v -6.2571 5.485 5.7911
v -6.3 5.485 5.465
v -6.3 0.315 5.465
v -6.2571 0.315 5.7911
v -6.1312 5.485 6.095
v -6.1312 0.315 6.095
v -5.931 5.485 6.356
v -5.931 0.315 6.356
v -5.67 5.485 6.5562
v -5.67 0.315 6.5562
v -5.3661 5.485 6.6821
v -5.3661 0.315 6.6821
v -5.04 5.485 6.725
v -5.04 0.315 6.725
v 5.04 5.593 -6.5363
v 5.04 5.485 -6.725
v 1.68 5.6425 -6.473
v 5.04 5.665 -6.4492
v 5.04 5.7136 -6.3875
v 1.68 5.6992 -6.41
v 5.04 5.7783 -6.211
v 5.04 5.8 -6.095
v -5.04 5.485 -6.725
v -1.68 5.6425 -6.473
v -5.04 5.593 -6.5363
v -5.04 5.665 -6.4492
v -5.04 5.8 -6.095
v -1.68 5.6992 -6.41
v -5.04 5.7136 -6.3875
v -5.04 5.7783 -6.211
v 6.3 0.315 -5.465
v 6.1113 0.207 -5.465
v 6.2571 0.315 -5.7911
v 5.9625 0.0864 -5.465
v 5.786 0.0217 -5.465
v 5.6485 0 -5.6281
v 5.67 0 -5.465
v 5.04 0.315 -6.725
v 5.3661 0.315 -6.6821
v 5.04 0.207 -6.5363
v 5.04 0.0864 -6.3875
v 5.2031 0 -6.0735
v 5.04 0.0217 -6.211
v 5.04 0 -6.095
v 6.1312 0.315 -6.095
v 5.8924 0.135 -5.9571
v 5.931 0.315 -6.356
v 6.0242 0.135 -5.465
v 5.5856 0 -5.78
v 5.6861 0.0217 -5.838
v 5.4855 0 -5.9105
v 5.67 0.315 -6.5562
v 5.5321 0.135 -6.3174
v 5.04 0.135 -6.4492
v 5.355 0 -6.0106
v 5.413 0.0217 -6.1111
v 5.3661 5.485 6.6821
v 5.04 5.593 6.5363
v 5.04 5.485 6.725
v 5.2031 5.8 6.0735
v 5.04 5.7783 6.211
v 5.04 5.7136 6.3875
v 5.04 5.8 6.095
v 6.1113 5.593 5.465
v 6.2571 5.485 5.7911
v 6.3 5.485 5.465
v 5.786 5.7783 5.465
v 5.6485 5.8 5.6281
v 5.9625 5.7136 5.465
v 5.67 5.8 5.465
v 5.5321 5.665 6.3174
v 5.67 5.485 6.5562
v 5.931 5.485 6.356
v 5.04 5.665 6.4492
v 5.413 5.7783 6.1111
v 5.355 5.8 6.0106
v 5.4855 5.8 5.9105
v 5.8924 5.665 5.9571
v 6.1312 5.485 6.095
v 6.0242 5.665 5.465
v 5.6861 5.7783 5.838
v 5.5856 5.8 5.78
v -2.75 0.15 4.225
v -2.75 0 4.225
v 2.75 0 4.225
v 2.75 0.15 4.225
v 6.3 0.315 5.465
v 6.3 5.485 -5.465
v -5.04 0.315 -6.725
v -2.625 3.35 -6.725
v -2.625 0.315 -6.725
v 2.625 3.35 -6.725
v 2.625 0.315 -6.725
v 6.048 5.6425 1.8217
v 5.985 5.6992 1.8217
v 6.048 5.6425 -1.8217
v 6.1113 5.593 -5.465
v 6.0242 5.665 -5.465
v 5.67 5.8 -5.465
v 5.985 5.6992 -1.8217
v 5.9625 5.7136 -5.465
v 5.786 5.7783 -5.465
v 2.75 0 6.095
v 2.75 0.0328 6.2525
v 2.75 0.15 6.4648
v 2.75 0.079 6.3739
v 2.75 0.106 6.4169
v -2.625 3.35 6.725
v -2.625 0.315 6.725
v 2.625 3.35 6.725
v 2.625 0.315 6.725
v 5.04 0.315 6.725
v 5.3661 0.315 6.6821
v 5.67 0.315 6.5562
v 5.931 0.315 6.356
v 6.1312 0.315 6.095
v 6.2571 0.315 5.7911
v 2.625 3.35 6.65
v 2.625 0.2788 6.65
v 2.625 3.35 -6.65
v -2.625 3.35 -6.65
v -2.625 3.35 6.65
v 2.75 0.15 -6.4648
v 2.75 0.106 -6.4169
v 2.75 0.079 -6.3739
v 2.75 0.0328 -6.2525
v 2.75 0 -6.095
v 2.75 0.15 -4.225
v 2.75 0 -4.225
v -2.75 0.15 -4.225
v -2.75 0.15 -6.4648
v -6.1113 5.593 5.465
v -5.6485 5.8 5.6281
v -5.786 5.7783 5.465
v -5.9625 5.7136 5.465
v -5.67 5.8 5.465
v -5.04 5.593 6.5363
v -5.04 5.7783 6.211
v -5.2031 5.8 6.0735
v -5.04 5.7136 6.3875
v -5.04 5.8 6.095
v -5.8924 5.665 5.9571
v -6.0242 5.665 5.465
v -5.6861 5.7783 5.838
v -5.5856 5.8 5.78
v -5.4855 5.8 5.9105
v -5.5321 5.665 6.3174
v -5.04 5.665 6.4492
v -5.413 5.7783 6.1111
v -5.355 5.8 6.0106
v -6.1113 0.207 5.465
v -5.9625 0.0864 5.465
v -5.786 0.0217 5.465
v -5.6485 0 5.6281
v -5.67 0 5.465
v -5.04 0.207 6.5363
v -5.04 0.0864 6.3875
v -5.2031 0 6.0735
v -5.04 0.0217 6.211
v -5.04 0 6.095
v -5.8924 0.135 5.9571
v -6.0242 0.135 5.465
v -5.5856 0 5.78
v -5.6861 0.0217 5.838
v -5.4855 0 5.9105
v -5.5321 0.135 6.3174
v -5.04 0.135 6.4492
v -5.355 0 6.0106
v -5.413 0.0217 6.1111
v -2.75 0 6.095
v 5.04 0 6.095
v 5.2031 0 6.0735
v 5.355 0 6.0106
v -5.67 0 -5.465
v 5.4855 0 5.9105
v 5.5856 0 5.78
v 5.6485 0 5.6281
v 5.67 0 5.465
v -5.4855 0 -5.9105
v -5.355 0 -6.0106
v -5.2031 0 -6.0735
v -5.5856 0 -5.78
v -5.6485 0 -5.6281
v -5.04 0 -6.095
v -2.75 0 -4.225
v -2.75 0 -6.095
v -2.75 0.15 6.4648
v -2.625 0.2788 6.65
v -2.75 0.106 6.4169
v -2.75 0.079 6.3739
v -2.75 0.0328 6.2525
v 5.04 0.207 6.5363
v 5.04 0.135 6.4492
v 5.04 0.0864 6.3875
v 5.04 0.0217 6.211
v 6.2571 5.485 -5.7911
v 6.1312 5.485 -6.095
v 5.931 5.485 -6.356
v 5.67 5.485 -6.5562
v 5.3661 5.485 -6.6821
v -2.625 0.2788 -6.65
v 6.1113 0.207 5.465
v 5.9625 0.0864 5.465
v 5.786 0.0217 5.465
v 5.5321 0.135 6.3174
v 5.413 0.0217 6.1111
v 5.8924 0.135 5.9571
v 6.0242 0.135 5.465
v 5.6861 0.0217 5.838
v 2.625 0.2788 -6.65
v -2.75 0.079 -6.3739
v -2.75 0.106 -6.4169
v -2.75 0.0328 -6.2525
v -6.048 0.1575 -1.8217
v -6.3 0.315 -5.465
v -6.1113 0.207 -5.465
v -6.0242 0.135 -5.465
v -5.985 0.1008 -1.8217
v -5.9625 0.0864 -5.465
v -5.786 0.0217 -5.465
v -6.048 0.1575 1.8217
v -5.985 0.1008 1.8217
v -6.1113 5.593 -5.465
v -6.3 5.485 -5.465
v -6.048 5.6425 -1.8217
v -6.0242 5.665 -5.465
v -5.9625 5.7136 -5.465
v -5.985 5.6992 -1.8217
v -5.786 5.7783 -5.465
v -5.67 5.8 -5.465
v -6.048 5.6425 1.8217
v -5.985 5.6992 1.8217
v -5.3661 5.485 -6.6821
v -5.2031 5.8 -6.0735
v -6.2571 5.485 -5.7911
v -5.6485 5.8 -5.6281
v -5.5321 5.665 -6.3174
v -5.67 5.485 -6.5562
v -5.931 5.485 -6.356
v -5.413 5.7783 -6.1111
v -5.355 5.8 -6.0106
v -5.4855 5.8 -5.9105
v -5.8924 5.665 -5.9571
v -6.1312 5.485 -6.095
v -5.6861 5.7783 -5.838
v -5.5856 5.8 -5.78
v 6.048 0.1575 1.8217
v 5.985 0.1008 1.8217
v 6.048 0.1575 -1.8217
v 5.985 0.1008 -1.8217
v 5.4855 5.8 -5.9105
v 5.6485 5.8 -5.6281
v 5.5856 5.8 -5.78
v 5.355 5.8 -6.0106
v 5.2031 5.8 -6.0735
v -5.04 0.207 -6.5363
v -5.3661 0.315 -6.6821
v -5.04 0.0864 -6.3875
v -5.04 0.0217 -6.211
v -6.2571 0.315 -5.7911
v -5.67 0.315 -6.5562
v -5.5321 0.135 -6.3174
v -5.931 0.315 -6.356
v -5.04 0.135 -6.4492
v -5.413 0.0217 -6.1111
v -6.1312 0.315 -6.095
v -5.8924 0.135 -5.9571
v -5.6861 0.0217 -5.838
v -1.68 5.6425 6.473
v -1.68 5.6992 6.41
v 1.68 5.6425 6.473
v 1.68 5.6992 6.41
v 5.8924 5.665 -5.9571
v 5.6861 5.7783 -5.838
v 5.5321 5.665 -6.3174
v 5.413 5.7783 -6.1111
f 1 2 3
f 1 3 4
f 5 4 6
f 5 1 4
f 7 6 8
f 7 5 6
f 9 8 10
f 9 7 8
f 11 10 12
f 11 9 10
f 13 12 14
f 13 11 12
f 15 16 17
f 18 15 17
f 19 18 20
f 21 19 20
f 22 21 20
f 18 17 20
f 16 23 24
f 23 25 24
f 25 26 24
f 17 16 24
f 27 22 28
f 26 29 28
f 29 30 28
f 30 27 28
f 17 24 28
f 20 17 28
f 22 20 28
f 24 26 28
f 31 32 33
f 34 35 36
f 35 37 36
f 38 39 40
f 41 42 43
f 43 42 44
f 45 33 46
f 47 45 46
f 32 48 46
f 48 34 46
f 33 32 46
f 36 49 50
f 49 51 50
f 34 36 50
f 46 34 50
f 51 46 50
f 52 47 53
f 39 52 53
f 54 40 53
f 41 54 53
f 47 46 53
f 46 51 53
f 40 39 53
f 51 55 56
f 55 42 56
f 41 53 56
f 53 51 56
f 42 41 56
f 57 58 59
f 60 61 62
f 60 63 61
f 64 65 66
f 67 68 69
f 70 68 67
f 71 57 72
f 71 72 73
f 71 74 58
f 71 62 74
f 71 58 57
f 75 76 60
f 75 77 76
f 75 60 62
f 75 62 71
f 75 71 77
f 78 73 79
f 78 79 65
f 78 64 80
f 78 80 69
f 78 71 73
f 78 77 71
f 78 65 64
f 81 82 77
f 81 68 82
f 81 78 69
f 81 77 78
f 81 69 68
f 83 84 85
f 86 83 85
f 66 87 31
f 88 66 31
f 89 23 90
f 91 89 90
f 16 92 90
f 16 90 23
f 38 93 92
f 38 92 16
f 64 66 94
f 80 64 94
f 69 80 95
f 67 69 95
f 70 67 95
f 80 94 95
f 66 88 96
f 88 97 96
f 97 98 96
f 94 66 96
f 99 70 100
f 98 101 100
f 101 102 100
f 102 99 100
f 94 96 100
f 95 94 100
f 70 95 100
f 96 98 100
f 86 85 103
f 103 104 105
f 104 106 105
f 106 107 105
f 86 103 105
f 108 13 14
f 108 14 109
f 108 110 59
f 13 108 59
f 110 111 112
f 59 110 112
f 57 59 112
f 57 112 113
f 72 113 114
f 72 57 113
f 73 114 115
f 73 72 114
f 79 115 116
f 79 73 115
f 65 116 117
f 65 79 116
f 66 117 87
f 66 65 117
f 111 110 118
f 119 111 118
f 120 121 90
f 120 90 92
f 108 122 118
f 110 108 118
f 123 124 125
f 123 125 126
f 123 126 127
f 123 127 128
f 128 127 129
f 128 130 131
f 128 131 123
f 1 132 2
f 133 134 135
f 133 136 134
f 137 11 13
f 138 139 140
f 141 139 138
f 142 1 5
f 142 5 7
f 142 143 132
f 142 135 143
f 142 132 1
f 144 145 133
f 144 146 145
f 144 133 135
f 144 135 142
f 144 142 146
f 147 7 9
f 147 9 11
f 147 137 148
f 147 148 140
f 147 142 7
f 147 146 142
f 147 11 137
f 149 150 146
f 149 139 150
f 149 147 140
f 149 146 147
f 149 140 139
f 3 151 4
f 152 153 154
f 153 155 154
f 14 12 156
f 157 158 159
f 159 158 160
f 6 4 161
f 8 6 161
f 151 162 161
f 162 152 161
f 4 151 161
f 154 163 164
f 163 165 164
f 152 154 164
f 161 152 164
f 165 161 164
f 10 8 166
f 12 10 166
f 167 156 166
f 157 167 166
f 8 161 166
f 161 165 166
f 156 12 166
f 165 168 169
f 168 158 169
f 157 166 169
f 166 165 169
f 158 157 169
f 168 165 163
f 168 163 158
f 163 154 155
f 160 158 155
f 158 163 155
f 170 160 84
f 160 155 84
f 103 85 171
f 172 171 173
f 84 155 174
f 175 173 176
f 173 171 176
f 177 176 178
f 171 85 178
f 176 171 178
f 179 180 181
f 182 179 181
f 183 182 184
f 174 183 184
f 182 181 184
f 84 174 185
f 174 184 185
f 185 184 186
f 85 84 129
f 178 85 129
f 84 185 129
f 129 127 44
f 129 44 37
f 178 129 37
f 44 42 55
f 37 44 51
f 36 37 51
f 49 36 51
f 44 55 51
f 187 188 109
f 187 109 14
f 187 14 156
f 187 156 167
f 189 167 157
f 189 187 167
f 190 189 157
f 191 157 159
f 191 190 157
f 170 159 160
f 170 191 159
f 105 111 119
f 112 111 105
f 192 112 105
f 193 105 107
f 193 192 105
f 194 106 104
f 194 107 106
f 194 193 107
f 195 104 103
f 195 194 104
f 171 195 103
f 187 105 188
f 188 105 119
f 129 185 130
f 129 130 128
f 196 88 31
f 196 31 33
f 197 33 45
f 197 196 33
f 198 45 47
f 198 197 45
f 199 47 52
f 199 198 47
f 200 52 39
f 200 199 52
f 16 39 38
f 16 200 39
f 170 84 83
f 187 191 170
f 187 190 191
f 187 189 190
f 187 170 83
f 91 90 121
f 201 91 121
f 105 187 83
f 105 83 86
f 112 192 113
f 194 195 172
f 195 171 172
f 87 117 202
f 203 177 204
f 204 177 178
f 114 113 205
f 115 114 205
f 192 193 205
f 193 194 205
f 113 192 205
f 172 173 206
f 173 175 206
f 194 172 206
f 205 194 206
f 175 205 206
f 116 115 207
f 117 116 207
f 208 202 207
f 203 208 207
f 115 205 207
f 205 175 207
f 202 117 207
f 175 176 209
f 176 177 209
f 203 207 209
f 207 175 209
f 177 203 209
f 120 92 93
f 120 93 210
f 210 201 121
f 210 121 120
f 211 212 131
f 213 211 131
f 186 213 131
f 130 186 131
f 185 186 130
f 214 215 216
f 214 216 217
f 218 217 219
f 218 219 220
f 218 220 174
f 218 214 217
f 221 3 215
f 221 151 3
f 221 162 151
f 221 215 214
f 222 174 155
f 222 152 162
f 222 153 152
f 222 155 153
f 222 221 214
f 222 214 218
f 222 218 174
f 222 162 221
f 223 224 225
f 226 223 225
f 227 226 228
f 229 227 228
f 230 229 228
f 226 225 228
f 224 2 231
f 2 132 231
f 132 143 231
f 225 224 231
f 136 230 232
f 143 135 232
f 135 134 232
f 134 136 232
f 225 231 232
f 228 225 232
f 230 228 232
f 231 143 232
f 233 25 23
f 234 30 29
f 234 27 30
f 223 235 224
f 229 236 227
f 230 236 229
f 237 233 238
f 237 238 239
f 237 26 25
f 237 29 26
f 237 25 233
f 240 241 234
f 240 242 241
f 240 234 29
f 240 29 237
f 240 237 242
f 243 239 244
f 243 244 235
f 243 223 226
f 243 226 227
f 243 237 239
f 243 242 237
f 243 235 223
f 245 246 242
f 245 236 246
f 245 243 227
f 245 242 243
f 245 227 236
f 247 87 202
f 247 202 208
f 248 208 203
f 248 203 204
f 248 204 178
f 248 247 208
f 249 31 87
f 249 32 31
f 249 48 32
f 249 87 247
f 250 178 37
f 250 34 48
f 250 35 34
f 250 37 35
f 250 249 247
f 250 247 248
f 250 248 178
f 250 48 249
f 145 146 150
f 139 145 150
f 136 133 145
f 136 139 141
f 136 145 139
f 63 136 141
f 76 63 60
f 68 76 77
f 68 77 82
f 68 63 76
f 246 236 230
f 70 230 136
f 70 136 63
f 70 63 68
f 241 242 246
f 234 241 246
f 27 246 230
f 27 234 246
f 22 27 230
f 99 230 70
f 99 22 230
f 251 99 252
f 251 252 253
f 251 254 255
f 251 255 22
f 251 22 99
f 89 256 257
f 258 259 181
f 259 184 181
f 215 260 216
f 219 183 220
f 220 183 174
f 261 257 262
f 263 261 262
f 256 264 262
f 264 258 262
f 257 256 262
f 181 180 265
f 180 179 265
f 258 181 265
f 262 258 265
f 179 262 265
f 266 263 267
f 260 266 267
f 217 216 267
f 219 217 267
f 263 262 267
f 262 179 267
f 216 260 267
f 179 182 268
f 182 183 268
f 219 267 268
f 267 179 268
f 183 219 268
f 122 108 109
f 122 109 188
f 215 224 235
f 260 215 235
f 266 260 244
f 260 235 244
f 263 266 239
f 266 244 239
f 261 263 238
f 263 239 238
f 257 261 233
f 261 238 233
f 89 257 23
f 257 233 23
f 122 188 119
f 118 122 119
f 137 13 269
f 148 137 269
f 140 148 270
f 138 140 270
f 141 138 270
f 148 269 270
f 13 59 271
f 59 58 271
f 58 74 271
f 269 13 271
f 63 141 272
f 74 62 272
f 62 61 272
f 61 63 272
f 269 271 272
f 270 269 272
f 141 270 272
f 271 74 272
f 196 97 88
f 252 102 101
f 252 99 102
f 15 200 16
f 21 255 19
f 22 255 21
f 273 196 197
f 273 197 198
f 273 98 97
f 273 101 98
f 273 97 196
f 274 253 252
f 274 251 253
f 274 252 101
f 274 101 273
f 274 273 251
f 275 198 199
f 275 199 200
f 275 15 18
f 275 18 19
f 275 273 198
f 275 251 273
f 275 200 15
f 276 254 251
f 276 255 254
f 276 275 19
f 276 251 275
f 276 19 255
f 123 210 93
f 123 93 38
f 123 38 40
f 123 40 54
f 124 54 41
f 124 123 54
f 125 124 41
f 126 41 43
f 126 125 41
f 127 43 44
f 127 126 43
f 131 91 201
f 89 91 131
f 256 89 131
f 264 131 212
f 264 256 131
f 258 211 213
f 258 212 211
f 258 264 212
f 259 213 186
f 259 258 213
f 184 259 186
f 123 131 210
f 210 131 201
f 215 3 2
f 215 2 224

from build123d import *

# Parameters (mm, degrees)
SKETCH_1_W          = 12.6
SKETCH_1_H          = 13.45
EXTRUDE_1_DEPTH     = 5.8
FILLET_1_R          = 1.26
SKETCH_2_W          = 5.5
SKETCH_2_H          = 2.5
CUT_EXTRUDE_1_DEPTH = 0.15
SKETCH_4_W          = 5.25
SKETCH_4_H          = 0.075
CUT_EXTRUDE_2_DEPTH = 3.2


with BuildPart() as part:
    # 草图1 → 凸台-拉伸1 (new body)
    with BuildSketch(Plane(origin=(0, 0, 0), x_dir=(1, 0, 0), z_dir=(0, 1, 0))):
        Rectangle(SKETCH_1_W, SKETCH_1_H)
    extrude(amount=EXTRUDE_1_DEPTH)

    # 圆角1
    fillet_1_edges = [part.edges().sort_by_distance(p)[0] for p in [
        (6.3, 2.9, 6.725),
        (-6.3, 2.9, 6.725),
        (-6.3, 2.9, -6.725),
        (6.3, 2.9, -6.725),
    ]]
    fillet(fillet_1_edges, radius=FILLET_1_R)

    # 草图2 → 切除-拉伸1 (cut)
    with BuildSketch(Plane.XZ):
        with Locations((0, 5.475)):
            Rectangle(SKETCH_2_W, SKETCH_2_H)
        with Locations((0, -5.475)):
            Rectangle(SKETCH_2_W, SKETCH_2_H)
    extrude(amount=-CUT_EXTRUDE_1_DEPTH, mode=Mode.SUBTRACT)

    # 切除-扫描1: sweep along a curve in space
    with BuildLine() as sweep_1_path:
        ThreePointArc((-6.3, 5.8, 5.465), (-5.930954544, 5.8, 6.355954544), (-5.04, 5.8, 6.725))
        Line((-5.04, 5.8, 6.725), (5.04, 5.8, 6.725))
        ThreePointArc((5.04, 5.8, 6.725), (5.930954544, 5.8, 6.355954544), (6.3, 5.8, 5.465))
        Line((6.3, 5.8, 5.465), (6.3, 5.8, -5.465))
        ThreePointArc((6.3, 5.8, -5.465), (5.930954544, 5.8, -6.355954544), (5.04, 5.8, -6.725))
        Line((5.04, 5.8, -6.725), (-5.04, 5.8, -6.725))
        ThreePointArc((-5.04, 5.8, -6.725), (-5.930954544, 5.8, -6.355954544), (-6.3, 5.8, -5.465))
        Line((-6.3, 5.8, -5.465), (-6.3, 5.8, 5.465))
    # 草图3 → 切除-扫描1 (sweep, cut)
    with BuildSketch(Plane(origin=(-5.04, 0, 0), x_dir=(0, 0, -1), z_dir=(1, 0, 0))):
        with BuildLine():
            Line((-6.095, 5.8), (-6.725, 5.8))
            Line((-6.725, 5.8), (-6.725, 5.485))
            add(Edge.make_bspline(
                [(-6.095, 5.8), (-6.115272631, 5.8), (-6.369249056, 5.757113449), (-6.508171408, 5.59551094), (-6.709225012, 5.485), (-6.725, 5.485)],
                knots=[0, 0, 0, 0, 0.46408315, 0.583014262, 1, 1, 1, 1], degree=3))
        make_face()
    sweep_1 = sweep(path=sweep_1_path.line, mode=Mode.SUBTRACT)

    # 镜向1: 切除-扫描1 across plane
    add(sweep_1.mirror(Plane.ZX.offset(2.9)), mode=Mode.SUBTRACT)

    # 草图4 → 切除-拉伸2 (cut)
    with BuildSketch(Plane(origin=(0, 0.15, 0), x_dir=(1, 0, 0), z_dir=(0, 1, 0))):
        with Locations((0, -6.6875)):
            Rectangle(SKETCH_4_W, SKETCH_4_H)
    cut_extrude_2 = extrude(amount=CUT_EXTRUDE_2_DEPTH, mode=Mode.SUBTRACT)

    # 镜向2: 切除-拉伸2 across plane
    add(cut_extrude_2.mirror(Plane.XY), mode=Mode.SUBTRACT)


solid = part.part
